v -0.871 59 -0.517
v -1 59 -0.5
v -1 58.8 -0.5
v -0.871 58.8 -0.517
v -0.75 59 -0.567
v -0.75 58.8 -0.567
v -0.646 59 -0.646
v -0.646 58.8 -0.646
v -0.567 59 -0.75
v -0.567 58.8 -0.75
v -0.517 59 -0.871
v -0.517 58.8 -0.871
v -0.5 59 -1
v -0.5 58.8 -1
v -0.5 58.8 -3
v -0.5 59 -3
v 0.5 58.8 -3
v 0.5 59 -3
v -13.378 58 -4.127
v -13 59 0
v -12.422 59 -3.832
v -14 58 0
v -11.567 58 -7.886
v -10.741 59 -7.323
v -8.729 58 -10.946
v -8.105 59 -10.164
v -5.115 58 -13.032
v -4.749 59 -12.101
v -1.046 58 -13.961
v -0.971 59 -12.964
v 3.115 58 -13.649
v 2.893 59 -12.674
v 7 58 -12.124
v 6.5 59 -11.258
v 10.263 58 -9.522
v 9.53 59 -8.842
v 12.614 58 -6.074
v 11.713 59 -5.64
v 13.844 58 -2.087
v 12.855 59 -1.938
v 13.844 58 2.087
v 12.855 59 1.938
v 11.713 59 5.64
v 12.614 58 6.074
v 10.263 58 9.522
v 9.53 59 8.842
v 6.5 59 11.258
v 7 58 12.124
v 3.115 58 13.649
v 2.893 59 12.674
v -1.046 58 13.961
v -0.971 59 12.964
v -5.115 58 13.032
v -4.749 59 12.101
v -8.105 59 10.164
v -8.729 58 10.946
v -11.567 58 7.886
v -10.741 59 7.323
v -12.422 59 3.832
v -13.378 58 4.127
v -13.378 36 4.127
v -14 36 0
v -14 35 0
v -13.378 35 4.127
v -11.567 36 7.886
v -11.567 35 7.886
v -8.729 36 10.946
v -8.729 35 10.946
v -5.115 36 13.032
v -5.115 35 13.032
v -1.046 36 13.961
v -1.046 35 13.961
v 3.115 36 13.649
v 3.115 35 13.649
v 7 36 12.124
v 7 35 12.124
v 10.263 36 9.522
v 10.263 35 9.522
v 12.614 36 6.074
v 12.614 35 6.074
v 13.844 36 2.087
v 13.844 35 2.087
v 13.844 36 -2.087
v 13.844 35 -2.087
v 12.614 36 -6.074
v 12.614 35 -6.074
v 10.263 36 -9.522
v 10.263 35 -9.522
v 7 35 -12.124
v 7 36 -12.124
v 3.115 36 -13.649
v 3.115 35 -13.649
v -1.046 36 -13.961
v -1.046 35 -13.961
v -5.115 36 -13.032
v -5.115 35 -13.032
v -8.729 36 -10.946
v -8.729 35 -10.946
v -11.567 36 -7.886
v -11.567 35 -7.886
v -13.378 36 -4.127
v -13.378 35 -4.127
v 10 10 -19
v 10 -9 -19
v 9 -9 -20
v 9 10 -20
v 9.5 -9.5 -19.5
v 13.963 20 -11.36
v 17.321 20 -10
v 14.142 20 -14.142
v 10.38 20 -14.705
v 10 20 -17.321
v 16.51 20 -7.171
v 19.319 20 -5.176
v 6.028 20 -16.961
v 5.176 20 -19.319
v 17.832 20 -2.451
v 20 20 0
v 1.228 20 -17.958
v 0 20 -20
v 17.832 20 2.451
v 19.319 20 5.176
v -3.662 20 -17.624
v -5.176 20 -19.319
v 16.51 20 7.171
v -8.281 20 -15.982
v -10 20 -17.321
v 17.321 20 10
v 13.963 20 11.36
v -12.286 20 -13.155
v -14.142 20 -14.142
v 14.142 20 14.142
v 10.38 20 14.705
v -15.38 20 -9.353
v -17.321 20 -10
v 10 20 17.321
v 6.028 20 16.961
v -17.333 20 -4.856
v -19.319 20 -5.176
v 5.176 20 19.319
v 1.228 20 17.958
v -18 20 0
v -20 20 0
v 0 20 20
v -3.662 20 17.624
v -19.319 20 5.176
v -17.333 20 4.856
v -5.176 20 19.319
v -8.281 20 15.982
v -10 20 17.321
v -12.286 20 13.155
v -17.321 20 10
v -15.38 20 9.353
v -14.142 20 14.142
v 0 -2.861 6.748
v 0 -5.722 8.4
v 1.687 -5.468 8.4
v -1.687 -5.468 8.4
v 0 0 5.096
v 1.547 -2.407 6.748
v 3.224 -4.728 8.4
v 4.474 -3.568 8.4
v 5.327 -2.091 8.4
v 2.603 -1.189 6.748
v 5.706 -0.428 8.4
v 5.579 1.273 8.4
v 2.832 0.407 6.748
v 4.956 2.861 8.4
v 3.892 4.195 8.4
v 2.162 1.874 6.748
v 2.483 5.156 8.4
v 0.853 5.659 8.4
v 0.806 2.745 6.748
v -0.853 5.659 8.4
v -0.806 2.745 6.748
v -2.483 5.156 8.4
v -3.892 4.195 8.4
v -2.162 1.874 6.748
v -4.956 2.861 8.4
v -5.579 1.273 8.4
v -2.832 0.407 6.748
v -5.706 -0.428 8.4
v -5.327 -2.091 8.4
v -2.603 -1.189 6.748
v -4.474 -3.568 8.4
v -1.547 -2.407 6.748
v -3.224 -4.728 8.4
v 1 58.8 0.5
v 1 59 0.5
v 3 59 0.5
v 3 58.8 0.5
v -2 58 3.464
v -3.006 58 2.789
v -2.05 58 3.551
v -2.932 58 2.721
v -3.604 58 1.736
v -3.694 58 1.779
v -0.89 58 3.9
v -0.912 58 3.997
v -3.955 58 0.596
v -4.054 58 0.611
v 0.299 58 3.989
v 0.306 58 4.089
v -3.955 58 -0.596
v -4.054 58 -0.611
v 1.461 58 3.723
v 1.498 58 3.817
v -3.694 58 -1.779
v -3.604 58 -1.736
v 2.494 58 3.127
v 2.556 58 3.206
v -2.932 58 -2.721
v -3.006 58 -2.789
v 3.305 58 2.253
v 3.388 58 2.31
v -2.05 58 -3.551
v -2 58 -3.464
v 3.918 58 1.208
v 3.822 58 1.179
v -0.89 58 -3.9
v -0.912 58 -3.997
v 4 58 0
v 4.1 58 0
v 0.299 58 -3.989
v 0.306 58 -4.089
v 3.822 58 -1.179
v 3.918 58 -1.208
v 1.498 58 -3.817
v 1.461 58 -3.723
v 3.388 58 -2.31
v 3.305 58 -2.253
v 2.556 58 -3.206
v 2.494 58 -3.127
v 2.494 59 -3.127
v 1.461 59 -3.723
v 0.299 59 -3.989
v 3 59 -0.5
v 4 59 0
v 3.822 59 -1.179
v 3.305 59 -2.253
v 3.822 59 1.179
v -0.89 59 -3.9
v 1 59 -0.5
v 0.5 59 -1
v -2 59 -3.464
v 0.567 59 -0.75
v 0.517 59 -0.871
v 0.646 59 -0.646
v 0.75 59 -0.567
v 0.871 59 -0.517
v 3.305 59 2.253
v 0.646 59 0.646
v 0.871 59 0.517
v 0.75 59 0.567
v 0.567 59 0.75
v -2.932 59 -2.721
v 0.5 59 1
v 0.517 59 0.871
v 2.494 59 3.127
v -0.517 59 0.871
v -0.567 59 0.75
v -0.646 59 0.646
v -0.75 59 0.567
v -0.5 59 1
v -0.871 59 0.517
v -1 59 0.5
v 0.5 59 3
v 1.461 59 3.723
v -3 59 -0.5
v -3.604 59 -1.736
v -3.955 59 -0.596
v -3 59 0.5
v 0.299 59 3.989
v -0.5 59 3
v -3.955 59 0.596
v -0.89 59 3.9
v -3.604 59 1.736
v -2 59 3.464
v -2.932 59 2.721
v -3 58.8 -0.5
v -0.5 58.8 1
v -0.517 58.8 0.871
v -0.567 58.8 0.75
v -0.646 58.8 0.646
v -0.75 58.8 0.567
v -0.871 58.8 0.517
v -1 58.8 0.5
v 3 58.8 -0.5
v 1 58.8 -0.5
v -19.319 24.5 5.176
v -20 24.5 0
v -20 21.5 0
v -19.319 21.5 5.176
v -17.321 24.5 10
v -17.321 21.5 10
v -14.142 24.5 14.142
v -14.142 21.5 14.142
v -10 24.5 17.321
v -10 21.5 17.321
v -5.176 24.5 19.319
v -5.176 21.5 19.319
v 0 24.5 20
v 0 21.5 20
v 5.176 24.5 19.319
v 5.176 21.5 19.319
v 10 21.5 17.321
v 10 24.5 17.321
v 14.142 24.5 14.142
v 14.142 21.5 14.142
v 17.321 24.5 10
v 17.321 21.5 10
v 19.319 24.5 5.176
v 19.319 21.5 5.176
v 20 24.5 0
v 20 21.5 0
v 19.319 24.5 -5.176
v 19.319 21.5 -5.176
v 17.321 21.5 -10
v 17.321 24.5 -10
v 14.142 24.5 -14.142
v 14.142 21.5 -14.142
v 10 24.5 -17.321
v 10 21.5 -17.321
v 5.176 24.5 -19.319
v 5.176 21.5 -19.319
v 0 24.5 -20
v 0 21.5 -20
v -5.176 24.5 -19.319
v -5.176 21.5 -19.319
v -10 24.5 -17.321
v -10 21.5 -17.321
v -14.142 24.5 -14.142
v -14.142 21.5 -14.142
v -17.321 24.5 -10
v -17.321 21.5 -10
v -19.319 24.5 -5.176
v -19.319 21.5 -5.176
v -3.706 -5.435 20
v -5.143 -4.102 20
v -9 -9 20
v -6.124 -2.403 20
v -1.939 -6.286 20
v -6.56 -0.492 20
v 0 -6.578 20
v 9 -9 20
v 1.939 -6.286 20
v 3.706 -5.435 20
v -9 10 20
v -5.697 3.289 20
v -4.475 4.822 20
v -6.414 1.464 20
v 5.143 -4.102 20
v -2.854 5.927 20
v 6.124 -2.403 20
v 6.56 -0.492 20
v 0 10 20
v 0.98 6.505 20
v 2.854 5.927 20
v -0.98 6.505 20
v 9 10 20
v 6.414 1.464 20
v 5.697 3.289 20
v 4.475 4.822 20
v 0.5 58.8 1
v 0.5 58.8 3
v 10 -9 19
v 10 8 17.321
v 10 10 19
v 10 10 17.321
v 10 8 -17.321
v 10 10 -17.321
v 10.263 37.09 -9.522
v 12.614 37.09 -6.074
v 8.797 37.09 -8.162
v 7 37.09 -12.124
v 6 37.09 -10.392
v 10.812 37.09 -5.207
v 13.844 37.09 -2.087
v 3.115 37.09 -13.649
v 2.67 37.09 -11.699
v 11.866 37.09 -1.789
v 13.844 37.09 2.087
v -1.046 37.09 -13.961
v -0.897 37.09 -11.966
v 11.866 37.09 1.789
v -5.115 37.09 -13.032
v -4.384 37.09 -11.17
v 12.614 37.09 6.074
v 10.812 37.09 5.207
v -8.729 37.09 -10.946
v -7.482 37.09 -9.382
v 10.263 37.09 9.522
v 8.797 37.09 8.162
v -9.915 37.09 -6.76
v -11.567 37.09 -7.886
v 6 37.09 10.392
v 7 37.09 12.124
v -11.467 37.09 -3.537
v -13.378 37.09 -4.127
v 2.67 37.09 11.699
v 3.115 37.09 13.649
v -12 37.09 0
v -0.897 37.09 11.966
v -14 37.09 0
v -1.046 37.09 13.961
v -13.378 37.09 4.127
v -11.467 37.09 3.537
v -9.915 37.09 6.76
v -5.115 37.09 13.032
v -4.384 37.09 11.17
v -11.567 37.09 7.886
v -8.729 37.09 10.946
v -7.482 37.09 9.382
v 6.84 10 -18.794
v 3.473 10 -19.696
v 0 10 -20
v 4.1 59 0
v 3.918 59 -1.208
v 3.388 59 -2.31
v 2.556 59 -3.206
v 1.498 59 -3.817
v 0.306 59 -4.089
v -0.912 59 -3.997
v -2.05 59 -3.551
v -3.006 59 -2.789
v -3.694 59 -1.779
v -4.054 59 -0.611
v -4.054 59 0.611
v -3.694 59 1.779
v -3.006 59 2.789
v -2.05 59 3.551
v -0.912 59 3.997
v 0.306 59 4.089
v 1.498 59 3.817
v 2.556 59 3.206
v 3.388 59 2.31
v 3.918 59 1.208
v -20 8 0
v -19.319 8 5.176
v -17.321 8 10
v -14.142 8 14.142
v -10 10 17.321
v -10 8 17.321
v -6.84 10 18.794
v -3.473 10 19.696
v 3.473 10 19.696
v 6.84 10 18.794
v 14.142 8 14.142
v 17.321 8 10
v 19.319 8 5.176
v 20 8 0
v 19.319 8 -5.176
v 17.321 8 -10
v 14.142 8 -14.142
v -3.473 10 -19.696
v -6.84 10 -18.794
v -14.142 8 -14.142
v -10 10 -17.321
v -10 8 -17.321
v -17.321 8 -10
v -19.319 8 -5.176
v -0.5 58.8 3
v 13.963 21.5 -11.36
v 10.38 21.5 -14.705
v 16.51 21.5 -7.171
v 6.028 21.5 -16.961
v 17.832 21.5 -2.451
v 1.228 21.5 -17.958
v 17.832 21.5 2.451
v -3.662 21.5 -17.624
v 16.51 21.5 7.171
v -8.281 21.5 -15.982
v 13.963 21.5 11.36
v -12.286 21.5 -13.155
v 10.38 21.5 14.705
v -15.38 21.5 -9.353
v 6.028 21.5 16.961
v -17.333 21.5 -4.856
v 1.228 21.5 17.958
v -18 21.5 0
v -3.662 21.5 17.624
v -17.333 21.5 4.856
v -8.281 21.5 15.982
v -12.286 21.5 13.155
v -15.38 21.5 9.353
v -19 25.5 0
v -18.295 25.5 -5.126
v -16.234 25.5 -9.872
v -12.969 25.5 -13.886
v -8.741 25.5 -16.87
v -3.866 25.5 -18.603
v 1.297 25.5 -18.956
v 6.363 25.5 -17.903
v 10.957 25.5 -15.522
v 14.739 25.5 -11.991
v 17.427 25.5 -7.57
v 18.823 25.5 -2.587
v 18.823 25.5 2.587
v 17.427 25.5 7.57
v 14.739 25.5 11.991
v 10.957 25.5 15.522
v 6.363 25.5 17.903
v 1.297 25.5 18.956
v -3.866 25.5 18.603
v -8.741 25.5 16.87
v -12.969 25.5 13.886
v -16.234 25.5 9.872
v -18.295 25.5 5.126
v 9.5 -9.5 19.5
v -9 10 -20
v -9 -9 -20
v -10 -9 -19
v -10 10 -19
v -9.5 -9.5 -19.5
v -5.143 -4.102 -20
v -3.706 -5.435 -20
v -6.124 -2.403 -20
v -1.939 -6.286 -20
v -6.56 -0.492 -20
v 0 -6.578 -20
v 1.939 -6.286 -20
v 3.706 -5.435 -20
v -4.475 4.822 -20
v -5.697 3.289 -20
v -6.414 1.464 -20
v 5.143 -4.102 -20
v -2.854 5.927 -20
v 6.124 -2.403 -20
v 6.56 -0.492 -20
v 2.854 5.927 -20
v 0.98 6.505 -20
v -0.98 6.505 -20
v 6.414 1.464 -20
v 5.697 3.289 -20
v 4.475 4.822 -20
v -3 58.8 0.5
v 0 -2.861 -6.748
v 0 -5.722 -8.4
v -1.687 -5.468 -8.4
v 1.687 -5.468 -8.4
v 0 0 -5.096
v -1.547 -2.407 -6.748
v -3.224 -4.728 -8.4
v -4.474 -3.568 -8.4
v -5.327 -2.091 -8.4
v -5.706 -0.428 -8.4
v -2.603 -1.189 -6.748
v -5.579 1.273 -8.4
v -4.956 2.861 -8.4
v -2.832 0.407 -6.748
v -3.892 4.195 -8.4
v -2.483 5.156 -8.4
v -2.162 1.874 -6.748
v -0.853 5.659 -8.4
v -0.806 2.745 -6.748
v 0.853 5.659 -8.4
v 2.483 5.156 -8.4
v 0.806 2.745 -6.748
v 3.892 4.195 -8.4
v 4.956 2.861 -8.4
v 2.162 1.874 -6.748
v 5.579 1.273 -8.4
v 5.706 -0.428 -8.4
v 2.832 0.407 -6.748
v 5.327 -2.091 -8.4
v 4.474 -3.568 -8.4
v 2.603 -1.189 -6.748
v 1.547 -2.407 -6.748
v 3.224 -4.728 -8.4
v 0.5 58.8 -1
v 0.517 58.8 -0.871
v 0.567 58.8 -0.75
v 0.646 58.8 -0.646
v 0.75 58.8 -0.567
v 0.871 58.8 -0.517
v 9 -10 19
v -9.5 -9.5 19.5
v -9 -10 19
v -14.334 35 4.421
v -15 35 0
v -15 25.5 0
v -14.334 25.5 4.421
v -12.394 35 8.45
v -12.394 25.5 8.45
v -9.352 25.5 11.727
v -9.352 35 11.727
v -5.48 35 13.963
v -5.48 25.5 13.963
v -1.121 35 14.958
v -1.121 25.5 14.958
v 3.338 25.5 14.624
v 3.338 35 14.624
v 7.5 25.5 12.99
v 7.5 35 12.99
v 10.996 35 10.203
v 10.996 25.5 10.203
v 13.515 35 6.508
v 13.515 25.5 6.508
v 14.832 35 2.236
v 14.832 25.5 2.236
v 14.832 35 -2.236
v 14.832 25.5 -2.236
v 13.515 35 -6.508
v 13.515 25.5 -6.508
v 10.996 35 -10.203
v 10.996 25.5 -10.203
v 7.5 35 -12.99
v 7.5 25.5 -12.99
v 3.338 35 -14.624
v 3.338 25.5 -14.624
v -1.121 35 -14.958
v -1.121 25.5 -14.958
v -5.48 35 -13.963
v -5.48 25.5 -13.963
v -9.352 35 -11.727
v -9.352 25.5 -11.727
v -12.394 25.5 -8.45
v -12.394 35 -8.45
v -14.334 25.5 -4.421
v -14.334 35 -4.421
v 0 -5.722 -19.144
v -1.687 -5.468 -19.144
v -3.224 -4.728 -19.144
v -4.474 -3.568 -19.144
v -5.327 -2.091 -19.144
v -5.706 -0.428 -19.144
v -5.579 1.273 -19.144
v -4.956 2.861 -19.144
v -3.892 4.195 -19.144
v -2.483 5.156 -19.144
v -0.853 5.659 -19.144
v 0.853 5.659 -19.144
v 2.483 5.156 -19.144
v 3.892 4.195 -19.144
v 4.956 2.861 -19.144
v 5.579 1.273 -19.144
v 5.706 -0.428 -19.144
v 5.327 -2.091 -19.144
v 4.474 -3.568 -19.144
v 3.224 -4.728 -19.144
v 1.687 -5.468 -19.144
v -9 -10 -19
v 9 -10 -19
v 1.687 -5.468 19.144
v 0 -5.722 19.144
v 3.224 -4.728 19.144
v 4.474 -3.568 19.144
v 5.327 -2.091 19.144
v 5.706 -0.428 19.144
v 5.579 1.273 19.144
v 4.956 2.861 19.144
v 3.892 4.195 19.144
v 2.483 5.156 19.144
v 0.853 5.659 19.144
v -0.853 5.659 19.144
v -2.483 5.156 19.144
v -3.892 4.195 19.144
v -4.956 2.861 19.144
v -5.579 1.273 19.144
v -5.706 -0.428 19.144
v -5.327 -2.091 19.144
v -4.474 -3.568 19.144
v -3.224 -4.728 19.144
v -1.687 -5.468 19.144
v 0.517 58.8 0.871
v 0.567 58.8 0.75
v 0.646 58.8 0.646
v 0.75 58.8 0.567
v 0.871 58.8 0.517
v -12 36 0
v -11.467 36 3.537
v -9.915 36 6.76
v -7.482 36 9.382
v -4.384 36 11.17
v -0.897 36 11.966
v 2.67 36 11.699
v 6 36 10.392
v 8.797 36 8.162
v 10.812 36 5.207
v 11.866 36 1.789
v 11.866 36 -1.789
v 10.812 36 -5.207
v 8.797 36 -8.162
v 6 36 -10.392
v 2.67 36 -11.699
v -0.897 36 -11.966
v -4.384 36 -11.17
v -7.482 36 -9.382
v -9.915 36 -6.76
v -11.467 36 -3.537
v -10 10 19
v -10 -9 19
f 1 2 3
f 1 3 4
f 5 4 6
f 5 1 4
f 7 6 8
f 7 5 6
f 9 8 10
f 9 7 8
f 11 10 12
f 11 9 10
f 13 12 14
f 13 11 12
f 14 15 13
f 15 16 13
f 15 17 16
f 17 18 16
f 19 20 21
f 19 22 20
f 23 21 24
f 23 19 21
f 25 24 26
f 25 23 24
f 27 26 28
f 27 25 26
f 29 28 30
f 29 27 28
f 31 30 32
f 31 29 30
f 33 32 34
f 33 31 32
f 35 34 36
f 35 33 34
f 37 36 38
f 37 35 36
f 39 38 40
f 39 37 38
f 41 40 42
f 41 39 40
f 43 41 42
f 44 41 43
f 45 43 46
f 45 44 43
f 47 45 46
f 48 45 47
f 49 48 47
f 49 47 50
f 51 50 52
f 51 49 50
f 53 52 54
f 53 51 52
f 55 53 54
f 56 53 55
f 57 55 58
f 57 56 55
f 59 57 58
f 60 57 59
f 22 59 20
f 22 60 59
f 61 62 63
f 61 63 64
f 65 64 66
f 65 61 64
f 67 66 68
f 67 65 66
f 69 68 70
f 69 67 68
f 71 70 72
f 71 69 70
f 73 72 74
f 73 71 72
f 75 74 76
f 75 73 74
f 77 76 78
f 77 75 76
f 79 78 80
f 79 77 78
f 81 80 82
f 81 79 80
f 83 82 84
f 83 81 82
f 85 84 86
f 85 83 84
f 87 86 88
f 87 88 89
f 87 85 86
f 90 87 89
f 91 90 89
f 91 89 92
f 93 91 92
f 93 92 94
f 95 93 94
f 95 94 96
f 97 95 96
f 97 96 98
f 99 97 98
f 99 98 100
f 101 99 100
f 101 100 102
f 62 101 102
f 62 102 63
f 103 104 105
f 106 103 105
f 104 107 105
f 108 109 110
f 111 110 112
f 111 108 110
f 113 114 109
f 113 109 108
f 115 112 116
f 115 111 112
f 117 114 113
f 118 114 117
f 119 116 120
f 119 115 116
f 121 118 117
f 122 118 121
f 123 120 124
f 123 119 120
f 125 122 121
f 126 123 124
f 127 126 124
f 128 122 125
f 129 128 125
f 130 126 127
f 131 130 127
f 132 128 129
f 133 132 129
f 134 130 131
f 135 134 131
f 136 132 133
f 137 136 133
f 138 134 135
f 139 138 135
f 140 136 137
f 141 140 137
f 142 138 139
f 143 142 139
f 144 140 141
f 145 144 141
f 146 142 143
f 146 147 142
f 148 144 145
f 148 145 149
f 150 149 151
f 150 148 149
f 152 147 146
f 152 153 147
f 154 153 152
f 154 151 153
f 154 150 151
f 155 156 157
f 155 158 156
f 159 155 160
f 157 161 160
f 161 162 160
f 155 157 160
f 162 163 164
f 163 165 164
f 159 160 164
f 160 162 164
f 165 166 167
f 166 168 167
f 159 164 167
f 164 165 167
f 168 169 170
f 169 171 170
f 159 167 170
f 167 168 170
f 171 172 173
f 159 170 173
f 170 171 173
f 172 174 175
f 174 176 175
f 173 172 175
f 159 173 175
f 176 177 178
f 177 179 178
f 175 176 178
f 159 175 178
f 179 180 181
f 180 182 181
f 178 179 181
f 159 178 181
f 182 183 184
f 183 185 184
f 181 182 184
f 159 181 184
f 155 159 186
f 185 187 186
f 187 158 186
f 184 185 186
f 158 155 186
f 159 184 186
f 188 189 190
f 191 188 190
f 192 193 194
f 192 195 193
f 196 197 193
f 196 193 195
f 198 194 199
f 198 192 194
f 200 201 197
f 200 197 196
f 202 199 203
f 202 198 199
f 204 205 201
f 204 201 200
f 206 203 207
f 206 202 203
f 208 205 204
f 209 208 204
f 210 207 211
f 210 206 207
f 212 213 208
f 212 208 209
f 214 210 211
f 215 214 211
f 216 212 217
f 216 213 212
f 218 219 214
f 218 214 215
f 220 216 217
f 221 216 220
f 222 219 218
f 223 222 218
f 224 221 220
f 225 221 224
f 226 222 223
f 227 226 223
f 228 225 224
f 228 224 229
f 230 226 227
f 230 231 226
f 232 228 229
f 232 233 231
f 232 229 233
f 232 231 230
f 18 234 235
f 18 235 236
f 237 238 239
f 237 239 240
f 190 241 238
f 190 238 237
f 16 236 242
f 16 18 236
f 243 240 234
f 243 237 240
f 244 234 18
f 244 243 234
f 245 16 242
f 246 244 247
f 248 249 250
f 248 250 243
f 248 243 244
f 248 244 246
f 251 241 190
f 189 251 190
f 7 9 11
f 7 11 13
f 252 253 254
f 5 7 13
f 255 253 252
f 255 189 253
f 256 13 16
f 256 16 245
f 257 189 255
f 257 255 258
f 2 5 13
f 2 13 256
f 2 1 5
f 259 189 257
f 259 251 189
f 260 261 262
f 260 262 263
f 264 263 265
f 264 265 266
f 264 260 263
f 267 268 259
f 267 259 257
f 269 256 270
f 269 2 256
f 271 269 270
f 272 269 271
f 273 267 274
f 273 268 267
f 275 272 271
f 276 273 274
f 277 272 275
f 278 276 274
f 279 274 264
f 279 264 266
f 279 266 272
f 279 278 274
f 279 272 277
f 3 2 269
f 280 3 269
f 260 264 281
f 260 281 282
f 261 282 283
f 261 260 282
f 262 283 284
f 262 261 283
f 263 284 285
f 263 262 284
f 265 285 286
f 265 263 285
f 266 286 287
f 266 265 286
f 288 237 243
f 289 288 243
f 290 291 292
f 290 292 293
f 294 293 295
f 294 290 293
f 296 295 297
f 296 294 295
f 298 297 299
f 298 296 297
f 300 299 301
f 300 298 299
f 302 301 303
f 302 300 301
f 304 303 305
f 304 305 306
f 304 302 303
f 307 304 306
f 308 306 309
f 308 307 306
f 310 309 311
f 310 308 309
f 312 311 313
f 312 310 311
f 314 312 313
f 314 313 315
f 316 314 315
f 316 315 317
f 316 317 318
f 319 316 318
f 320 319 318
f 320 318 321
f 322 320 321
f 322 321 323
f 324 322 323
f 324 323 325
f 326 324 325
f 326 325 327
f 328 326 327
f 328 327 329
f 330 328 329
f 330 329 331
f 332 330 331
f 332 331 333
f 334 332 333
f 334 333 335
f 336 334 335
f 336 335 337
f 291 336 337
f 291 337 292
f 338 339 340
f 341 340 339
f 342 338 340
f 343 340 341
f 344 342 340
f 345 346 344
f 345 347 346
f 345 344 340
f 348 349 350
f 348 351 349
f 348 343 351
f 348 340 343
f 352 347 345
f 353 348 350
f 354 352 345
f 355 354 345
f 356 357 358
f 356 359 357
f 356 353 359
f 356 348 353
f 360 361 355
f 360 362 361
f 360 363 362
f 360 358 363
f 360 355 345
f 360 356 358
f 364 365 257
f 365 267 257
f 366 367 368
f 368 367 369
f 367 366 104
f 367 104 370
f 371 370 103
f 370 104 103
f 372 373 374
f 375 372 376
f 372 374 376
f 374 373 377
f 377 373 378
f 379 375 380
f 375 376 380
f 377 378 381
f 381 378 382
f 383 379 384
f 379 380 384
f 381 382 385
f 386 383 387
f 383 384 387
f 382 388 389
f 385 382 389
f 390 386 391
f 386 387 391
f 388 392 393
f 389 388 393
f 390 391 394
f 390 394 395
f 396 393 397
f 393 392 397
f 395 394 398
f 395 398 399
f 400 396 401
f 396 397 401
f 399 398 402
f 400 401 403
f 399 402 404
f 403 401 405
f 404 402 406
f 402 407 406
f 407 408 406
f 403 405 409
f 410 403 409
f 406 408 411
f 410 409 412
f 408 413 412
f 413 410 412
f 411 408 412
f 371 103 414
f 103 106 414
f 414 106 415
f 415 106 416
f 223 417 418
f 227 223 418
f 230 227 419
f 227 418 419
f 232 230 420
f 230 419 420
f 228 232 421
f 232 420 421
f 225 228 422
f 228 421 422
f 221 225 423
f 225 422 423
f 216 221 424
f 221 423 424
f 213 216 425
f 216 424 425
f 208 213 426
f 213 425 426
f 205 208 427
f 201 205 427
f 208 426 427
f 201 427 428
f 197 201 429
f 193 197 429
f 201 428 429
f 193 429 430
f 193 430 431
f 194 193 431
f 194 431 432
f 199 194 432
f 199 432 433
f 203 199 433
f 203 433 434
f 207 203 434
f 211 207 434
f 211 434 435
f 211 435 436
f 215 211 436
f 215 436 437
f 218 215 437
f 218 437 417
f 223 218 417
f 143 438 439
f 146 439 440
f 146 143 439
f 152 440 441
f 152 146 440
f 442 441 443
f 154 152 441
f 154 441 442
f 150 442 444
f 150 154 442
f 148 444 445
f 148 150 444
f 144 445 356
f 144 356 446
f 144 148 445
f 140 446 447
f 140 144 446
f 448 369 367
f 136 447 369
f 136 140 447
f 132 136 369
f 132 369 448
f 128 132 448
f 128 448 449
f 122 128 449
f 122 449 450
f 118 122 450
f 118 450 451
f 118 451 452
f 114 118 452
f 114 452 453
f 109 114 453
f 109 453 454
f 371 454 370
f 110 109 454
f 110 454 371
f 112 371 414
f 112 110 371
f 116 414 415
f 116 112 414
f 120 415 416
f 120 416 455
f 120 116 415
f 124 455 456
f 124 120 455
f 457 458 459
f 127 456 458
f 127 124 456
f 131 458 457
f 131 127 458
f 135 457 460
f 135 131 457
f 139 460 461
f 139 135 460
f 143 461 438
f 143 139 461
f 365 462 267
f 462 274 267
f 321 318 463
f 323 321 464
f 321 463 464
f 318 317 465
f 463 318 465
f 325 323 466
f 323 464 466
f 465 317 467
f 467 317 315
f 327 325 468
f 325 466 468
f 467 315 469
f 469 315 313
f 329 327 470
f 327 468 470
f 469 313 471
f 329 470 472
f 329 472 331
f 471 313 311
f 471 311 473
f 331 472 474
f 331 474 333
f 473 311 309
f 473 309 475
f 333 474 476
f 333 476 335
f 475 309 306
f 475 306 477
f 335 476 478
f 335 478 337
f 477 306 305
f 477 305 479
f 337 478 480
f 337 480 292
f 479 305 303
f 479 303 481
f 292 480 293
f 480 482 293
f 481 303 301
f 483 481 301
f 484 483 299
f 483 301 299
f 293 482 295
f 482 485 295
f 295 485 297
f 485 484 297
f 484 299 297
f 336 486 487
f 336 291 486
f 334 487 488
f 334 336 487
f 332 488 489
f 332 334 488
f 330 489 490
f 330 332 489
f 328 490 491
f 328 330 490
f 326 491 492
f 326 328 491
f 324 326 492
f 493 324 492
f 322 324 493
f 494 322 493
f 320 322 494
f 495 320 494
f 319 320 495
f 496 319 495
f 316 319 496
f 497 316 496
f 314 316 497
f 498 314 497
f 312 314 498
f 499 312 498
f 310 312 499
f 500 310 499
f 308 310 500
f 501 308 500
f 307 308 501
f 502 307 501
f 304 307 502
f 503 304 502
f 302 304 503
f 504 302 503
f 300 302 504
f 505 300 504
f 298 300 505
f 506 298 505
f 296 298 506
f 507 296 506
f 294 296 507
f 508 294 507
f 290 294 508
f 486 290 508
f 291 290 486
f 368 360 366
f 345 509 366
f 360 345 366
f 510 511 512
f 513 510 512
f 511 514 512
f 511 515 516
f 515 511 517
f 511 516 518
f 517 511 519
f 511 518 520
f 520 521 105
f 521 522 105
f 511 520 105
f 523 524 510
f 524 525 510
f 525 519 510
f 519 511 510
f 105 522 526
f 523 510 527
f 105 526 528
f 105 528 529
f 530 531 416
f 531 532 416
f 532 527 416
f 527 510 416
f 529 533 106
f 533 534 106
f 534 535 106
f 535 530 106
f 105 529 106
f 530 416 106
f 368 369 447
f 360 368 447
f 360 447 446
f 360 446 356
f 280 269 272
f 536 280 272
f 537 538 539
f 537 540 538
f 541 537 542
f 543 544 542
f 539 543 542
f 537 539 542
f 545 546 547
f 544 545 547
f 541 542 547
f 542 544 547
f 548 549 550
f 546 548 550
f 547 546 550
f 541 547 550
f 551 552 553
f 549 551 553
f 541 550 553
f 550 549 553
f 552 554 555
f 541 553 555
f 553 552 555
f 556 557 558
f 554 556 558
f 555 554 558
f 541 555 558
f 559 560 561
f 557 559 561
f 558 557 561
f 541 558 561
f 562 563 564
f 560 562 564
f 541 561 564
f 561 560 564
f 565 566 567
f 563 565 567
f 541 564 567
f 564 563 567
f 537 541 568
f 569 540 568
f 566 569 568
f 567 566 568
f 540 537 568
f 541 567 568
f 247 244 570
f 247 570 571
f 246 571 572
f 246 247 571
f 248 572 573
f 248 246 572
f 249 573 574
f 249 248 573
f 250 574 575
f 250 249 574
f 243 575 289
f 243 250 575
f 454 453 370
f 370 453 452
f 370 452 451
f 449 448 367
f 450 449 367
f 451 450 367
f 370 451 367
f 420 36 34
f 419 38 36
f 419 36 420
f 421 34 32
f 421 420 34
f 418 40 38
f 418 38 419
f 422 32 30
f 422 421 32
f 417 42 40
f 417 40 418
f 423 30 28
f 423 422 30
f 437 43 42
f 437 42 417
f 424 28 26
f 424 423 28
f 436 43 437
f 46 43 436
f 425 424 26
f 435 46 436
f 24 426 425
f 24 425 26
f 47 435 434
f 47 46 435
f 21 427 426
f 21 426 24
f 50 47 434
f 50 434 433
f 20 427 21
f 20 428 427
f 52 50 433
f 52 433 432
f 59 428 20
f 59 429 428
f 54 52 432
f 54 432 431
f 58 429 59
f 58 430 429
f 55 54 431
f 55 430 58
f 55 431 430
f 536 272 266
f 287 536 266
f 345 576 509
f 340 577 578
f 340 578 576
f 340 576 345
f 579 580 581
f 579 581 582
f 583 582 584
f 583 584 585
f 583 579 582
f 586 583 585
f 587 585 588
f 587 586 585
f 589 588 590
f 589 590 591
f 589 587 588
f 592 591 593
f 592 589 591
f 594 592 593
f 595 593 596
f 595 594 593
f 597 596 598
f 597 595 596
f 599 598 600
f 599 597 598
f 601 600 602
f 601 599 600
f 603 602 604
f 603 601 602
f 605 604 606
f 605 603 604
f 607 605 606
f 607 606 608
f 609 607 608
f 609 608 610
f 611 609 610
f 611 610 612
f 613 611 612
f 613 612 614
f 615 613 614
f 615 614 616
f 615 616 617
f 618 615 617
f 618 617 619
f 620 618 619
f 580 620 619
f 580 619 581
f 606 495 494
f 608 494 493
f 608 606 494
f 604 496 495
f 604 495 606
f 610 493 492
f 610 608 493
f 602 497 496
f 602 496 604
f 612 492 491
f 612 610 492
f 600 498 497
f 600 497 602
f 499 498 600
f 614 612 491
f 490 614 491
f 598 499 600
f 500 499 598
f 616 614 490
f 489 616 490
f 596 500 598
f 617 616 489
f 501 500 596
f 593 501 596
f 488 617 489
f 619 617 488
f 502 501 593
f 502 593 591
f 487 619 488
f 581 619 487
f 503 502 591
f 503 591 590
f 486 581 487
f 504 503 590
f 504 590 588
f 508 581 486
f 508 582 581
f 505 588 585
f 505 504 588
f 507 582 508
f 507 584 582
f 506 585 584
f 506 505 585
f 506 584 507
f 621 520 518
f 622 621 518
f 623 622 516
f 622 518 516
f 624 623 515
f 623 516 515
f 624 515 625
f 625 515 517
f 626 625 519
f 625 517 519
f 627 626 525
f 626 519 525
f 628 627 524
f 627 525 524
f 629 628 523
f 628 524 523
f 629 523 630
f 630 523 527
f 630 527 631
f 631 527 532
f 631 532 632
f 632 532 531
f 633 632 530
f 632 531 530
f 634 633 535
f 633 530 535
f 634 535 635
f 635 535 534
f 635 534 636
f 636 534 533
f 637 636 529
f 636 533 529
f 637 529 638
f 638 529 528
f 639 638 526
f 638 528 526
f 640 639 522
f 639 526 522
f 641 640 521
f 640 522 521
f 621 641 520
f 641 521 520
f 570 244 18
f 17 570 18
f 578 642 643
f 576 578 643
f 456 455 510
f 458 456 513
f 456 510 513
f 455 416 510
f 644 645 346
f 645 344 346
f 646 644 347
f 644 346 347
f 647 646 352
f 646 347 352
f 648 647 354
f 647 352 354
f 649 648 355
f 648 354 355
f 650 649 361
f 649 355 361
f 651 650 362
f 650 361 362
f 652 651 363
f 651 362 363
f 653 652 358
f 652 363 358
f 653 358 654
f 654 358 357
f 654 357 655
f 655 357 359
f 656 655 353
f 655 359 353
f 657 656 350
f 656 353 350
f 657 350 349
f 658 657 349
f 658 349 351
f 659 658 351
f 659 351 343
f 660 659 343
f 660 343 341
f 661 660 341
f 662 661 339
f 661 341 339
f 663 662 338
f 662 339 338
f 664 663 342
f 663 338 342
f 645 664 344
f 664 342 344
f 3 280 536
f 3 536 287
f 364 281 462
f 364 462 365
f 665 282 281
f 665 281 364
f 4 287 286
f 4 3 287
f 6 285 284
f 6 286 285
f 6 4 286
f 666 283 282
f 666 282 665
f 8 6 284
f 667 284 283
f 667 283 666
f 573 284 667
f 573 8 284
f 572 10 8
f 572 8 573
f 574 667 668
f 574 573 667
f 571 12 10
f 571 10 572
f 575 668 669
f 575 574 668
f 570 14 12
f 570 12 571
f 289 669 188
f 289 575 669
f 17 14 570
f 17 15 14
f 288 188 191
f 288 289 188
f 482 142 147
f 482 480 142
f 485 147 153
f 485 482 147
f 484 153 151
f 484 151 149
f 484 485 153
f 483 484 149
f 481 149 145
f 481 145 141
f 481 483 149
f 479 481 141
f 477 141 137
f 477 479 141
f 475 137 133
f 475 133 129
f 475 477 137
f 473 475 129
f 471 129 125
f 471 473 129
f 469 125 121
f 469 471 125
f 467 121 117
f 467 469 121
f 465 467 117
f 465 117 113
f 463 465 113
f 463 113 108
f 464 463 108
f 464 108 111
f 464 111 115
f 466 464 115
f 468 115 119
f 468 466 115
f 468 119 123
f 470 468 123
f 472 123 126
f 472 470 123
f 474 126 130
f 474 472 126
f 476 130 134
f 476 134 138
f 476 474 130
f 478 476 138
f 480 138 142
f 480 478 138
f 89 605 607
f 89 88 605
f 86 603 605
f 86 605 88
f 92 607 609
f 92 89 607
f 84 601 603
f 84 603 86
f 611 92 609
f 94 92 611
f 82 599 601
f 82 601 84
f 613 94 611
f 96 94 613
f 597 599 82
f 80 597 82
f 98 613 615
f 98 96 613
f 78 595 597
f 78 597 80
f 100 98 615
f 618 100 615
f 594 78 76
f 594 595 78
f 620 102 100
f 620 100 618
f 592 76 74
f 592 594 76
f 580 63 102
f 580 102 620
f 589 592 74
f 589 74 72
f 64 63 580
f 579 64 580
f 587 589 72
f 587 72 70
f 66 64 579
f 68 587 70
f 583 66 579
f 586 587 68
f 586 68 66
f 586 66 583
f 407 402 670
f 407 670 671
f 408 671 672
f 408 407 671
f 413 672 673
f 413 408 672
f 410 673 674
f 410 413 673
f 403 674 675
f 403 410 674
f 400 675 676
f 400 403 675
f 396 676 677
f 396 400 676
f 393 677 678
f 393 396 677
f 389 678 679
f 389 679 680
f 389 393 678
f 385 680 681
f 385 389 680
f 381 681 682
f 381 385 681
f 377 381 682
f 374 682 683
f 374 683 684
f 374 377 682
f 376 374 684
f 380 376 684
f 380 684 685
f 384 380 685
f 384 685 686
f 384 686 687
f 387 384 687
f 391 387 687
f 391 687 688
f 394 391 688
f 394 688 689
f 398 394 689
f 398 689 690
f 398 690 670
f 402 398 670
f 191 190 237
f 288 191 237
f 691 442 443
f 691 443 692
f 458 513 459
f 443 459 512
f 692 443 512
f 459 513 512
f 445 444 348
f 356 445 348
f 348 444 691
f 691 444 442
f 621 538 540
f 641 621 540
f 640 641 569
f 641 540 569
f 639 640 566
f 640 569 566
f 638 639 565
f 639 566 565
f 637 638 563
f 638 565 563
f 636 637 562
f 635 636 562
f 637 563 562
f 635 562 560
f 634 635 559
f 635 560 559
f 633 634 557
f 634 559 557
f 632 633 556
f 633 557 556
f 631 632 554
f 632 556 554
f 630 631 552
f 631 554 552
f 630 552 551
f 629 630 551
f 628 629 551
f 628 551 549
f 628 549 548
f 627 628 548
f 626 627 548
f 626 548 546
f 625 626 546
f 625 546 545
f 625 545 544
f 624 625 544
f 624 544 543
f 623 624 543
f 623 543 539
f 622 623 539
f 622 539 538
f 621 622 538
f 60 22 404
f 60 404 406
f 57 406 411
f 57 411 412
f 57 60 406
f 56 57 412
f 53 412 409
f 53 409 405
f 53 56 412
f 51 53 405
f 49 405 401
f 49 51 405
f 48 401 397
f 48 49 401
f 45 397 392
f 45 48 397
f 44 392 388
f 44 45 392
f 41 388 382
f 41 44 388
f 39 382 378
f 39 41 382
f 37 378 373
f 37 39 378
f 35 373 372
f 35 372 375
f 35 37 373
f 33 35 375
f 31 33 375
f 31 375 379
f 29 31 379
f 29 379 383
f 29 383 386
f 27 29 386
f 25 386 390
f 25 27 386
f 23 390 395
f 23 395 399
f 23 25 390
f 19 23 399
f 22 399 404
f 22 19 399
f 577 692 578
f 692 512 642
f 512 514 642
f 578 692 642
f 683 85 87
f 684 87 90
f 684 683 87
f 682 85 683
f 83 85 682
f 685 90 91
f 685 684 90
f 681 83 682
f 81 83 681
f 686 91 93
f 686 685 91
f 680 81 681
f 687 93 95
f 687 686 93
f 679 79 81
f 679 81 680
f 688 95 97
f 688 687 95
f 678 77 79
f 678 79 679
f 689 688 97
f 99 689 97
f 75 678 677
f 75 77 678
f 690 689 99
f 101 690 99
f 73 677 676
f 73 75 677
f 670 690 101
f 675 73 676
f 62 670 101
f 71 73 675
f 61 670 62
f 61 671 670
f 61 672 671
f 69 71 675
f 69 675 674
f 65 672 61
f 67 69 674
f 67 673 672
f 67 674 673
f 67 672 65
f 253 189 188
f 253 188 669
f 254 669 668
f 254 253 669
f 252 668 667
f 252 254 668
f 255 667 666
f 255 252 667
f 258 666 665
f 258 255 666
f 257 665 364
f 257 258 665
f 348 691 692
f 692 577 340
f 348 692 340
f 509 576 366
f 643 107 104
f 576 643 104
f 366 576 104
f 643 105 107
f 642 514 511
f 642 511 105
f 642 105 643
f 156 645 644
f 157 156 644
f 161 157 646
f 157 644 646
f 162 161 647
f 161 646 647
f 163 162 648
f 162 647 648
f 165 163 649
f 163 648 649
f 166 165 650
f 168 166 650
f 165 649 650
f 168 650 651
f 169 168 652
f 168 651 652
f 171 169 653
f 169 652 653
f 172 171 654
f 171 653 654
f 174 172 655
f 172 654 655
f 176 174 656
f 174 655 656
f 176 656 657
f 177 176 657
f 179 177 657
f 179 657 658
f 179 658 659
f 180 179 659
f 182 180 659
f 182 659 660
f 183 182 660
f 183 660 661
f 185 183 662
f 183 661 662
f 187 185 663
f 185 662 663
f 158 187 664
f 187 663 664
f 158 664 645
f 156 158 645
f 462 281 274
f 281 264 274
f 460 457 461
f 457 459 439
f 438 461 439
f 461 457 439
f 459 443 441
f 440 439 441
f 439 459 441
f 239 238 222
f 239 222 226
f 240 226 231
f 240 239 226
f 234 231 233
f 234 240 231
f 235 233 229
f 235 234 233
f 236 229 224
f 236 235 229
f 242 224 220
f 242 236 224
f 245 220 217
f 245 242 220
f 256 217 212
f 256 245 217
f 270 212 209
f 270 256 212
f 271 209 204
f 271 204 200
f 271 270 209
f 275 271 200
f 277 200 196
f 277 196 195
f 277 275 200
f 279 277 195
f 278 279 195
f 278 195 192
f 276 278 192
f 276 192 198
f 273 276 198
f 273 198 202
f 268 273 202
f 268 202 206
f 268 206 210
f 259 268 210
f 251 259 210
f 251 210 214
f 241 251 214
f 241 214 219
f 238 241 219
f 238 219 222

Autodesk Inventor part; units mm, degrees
sketch "Sketch_1" plane through (0, 0, 0) normal (0, 0, 1) x (1, 0, 0)
  line L0 (-10, 10) -> (-10, -9)
  line L1 (-10, -9) -> (-9, -10)
  line L2 (-9, -10) -> (9, -10)
  line L3 (9, -10) -> (10, -9)
  line L4 (10, -9) -> (10, 10)
  line L5 (10, 10) -> (-10, 10)
extrude "Extrusion1" add sketch "Sketch_1" along normal mid plane 40
sketch "Sketch_2" plane through (0, 0, 0) normal (0, 1, 0) x (-1, 0, 0)
  line L0 (15, 25) -> (-15, 25)
  line L1 (-15, 25) -> (-15, -25)
  line L2 (-15, -25) -> (15, -25)
  line L3 (15, -25) -> (15, 25)
  line L4 (10, -19) -> (10, 19)
  line L5 (10, 19) -> (9, 20)
  line L6 (9, 20) -> (-9, 20)
  line L7 (-9, 20) -> (-10, 19)
  line L8 (-10, 19) -> (-10, -19)
  line L9 (-10, -19) -> (-9, -20)
  line L10 (-9, -20) -> (9, -20)
  line L11 (9, -20) -> (10, -19)
extrude "Extrusion2" cut sketch "Sketch_2" along normal mid plane 40
sketch "Sketch_3" plane through (0, 0, 0) normal (1, 0, 0) x (0, 1, 0)
  line L0 (15, 25) -> (-15, 25)
  line L1 (-15, 25) -> (-15, -25)
  line L2 (-15, -25) -> (15, -25)
  line L3 (15, -25) -> (15, -20)
  line L4 (15, -20) -> (-9, -20)
  line L5 (-9, -20) -> (-10, -19)
  line L6 (-10, -19) -> (-10, 19)
  line L7 (-10, 19) -> (-9, 20)
  line L8 (-9, 20) -> (15, 20)
  line L9 (15, 20) -> (15, 25)
extrude "Extrusion3" cut sketch "Sketch_3" along normal mid plane 20
sketch "Sketch_4" plane through (0, 0, 0) normal (0, 0, 1) x (1, 0, 0)
  line L0 (0, 59) -> (0, 8)
  line L1 (0, 8) -> (-20, 8)
  line L2 (-20, 8) -> (-20, 20)
  line L3 (-20, 20) -> (-18, 20)
  line L4 (-18, 20) -> (-18, 21.5)
  line L5 (-18, 21.5) -> (-20, 21.5)
  line L6 (-20, 21.5) -> (-20, 24.5)
  line L7 (-20, 24.5) -> (-19, 25.5)
  line L8 (-19, 25.5) -> (-15, 25.5)
  line L9 (-15, 25.5) -> (-15, 35)
  line L10 (-15, 35) -> (-14, 35)
  line L11 (-14, 35) -> (-14, 36)
  line L12 (-14, 36) -> (-12, 36)
  line L13 (-12, 36) -> (-12, 37.09)
  line L14 (-12, 37.09) -> (-14, 37.09)
  line L15 (-14, 37.09) -> (-14, 58)
  line L16 (-14, 58) -> (-13, 59)
  line L17 (-13, 59) -> (0, 59)
  line L18 (0, 59) -> (0, 8)
revolve "Revolution1" add sketch "Sketch_4" angle 360 about axis through (0, 59, 0) along (0, 1, 0)
thread "Thread1" size "M30x3.5" class "6g" standard "ISO Metric profile" full length
sketch "Sketch_5" plane through (0, 0, 0) normal (1, 0, 0) x (0, 1, 0)
  line L0 (0, 20) -> (0, 5.0961)
  line L1 (0, 5.0961) -> (-5.7225, 8.4)
  line L2 (-5.7225, 8.4) -> (-5.7225, 19.144)
  line L3 (-5.7225, 19.144) -> (-6.5785, 20)
  line L4 (-6.5785, 20) -> (0, 20)
  line L5 (0, 20) -> (0, 5.0961)
revolve "Revolution2" cut sketch "Sketch_5" angle 360 about axis through (0, 0, 20) along (0, 0, 1)
thread "Thread2" size "G13.157x1.337" designation "G 1/4" standard "ISO Pipe Threads" full length
sketch "Sketch_6" plane through (0, 0, 0) normal (1, 0, 0) x (0, 1, 0)
  line L0 (0, -5.0961) -> (0, -20)
  line L1 (0, -20) -> (-6.5785, -20)
  line L2 (-6.5785, -20) -> (-5.7225, -19.144)
  line L3 (-5.7225, -19.144) -> (-5.7225, -8.4)
  line L4 (-5.7225, -8.4) -> (0, -5.0961)
  line L5 (0, -5.0961) -> (0, -20)
revolve "Revolution3" cut sketch "Sketch_6" angle 360 about axis through (0, 0, -5.0961) along (0, 0, 1)
thread "Thread3" size "G13.157x1.337" designation "G 1/4" standard "ISO Pipe Threads" full length
sketch "Sketch_10" plane through (0, 59, 0) normal (0, 1, 0) x (1, 0, 0)
  line L0 (-3, -0.5) -> (-1, -0.5)
  arc A0 (-0.5, -1) -> (-1, -0.5) centre (-1, -1) ccw
  line L1 (-0.5, -1) -> (-0.5, -3)
  line L2 (-0.5, -3) -> (0.5, -3)
  line L3 (0.5, -3) -> (0.5, -1)
  arc A1 (1, -0.5) -> (0.5, -1) centre (1, -1) ccw
  line L4 (1, -0.5) -> (3, -0.5)
  line L5 (3, -0.5) -> (3, 0.5)
  line L6 (3, 0.5) -> (1, 0.5)
  arc A2 (0.5, 1) -> (1, 0.5) centre (1, 1) ccw
  line L7 (0.5, 1) -> (0.5, 3)
  line L8 (0.5, 3) -> (-0.5, 3)
  line L9 (-0.5, 3) -> (-0.5, 1)
  arc A3 (-1, 0.5) -> (-0.5, 1) centre (-1, 1) ccw
  line L10 (-1, 0.5) -> (-3, 0.5)
  line L11 (-3, 0.5) -> (-3, -0.5)
extrude "Extrusion4" cut sketch "Sketch_10" against normal blind 0.2
sketch "Sketch_11" plane through (0, 59, 0) normal (0, 1, 0) x (1, 0, 0)
  circle A0 centre (0, 0) radius 4.1
  circle A1 centre (0, 0) radius 4
extrude "Extrusion5" cut sketch "Sketch_11" against normal blind 1
ref_plane "body_dummy_XY" through (0, 0, 0) normal (0, 0, -1) x (1, 0, 0)
ref_plane "body_dummy_YZ" through (0, 0, 0) normal (1, 0, 0) x (0, -1, 0)
ref_plane "body_dummy_ZX" through (0, 0, 0) normal (0, -1, 0) x (0, 0, -1)
ref_plane "body_nut_XY" through (0, 27.1, 0) normal (0, 1, 0) x (1, 0, 0)
ref_plane "body_nut_YZ" through (0, 27.1, 0) normal (1, 0, 0) x (0, 0, -1)
ref_plane "body_nut_ZX" through (0, 27.1, 0) normal (0, 0, -1) x (0, 1, 0)
properties part number "AP100-02_BODY"
